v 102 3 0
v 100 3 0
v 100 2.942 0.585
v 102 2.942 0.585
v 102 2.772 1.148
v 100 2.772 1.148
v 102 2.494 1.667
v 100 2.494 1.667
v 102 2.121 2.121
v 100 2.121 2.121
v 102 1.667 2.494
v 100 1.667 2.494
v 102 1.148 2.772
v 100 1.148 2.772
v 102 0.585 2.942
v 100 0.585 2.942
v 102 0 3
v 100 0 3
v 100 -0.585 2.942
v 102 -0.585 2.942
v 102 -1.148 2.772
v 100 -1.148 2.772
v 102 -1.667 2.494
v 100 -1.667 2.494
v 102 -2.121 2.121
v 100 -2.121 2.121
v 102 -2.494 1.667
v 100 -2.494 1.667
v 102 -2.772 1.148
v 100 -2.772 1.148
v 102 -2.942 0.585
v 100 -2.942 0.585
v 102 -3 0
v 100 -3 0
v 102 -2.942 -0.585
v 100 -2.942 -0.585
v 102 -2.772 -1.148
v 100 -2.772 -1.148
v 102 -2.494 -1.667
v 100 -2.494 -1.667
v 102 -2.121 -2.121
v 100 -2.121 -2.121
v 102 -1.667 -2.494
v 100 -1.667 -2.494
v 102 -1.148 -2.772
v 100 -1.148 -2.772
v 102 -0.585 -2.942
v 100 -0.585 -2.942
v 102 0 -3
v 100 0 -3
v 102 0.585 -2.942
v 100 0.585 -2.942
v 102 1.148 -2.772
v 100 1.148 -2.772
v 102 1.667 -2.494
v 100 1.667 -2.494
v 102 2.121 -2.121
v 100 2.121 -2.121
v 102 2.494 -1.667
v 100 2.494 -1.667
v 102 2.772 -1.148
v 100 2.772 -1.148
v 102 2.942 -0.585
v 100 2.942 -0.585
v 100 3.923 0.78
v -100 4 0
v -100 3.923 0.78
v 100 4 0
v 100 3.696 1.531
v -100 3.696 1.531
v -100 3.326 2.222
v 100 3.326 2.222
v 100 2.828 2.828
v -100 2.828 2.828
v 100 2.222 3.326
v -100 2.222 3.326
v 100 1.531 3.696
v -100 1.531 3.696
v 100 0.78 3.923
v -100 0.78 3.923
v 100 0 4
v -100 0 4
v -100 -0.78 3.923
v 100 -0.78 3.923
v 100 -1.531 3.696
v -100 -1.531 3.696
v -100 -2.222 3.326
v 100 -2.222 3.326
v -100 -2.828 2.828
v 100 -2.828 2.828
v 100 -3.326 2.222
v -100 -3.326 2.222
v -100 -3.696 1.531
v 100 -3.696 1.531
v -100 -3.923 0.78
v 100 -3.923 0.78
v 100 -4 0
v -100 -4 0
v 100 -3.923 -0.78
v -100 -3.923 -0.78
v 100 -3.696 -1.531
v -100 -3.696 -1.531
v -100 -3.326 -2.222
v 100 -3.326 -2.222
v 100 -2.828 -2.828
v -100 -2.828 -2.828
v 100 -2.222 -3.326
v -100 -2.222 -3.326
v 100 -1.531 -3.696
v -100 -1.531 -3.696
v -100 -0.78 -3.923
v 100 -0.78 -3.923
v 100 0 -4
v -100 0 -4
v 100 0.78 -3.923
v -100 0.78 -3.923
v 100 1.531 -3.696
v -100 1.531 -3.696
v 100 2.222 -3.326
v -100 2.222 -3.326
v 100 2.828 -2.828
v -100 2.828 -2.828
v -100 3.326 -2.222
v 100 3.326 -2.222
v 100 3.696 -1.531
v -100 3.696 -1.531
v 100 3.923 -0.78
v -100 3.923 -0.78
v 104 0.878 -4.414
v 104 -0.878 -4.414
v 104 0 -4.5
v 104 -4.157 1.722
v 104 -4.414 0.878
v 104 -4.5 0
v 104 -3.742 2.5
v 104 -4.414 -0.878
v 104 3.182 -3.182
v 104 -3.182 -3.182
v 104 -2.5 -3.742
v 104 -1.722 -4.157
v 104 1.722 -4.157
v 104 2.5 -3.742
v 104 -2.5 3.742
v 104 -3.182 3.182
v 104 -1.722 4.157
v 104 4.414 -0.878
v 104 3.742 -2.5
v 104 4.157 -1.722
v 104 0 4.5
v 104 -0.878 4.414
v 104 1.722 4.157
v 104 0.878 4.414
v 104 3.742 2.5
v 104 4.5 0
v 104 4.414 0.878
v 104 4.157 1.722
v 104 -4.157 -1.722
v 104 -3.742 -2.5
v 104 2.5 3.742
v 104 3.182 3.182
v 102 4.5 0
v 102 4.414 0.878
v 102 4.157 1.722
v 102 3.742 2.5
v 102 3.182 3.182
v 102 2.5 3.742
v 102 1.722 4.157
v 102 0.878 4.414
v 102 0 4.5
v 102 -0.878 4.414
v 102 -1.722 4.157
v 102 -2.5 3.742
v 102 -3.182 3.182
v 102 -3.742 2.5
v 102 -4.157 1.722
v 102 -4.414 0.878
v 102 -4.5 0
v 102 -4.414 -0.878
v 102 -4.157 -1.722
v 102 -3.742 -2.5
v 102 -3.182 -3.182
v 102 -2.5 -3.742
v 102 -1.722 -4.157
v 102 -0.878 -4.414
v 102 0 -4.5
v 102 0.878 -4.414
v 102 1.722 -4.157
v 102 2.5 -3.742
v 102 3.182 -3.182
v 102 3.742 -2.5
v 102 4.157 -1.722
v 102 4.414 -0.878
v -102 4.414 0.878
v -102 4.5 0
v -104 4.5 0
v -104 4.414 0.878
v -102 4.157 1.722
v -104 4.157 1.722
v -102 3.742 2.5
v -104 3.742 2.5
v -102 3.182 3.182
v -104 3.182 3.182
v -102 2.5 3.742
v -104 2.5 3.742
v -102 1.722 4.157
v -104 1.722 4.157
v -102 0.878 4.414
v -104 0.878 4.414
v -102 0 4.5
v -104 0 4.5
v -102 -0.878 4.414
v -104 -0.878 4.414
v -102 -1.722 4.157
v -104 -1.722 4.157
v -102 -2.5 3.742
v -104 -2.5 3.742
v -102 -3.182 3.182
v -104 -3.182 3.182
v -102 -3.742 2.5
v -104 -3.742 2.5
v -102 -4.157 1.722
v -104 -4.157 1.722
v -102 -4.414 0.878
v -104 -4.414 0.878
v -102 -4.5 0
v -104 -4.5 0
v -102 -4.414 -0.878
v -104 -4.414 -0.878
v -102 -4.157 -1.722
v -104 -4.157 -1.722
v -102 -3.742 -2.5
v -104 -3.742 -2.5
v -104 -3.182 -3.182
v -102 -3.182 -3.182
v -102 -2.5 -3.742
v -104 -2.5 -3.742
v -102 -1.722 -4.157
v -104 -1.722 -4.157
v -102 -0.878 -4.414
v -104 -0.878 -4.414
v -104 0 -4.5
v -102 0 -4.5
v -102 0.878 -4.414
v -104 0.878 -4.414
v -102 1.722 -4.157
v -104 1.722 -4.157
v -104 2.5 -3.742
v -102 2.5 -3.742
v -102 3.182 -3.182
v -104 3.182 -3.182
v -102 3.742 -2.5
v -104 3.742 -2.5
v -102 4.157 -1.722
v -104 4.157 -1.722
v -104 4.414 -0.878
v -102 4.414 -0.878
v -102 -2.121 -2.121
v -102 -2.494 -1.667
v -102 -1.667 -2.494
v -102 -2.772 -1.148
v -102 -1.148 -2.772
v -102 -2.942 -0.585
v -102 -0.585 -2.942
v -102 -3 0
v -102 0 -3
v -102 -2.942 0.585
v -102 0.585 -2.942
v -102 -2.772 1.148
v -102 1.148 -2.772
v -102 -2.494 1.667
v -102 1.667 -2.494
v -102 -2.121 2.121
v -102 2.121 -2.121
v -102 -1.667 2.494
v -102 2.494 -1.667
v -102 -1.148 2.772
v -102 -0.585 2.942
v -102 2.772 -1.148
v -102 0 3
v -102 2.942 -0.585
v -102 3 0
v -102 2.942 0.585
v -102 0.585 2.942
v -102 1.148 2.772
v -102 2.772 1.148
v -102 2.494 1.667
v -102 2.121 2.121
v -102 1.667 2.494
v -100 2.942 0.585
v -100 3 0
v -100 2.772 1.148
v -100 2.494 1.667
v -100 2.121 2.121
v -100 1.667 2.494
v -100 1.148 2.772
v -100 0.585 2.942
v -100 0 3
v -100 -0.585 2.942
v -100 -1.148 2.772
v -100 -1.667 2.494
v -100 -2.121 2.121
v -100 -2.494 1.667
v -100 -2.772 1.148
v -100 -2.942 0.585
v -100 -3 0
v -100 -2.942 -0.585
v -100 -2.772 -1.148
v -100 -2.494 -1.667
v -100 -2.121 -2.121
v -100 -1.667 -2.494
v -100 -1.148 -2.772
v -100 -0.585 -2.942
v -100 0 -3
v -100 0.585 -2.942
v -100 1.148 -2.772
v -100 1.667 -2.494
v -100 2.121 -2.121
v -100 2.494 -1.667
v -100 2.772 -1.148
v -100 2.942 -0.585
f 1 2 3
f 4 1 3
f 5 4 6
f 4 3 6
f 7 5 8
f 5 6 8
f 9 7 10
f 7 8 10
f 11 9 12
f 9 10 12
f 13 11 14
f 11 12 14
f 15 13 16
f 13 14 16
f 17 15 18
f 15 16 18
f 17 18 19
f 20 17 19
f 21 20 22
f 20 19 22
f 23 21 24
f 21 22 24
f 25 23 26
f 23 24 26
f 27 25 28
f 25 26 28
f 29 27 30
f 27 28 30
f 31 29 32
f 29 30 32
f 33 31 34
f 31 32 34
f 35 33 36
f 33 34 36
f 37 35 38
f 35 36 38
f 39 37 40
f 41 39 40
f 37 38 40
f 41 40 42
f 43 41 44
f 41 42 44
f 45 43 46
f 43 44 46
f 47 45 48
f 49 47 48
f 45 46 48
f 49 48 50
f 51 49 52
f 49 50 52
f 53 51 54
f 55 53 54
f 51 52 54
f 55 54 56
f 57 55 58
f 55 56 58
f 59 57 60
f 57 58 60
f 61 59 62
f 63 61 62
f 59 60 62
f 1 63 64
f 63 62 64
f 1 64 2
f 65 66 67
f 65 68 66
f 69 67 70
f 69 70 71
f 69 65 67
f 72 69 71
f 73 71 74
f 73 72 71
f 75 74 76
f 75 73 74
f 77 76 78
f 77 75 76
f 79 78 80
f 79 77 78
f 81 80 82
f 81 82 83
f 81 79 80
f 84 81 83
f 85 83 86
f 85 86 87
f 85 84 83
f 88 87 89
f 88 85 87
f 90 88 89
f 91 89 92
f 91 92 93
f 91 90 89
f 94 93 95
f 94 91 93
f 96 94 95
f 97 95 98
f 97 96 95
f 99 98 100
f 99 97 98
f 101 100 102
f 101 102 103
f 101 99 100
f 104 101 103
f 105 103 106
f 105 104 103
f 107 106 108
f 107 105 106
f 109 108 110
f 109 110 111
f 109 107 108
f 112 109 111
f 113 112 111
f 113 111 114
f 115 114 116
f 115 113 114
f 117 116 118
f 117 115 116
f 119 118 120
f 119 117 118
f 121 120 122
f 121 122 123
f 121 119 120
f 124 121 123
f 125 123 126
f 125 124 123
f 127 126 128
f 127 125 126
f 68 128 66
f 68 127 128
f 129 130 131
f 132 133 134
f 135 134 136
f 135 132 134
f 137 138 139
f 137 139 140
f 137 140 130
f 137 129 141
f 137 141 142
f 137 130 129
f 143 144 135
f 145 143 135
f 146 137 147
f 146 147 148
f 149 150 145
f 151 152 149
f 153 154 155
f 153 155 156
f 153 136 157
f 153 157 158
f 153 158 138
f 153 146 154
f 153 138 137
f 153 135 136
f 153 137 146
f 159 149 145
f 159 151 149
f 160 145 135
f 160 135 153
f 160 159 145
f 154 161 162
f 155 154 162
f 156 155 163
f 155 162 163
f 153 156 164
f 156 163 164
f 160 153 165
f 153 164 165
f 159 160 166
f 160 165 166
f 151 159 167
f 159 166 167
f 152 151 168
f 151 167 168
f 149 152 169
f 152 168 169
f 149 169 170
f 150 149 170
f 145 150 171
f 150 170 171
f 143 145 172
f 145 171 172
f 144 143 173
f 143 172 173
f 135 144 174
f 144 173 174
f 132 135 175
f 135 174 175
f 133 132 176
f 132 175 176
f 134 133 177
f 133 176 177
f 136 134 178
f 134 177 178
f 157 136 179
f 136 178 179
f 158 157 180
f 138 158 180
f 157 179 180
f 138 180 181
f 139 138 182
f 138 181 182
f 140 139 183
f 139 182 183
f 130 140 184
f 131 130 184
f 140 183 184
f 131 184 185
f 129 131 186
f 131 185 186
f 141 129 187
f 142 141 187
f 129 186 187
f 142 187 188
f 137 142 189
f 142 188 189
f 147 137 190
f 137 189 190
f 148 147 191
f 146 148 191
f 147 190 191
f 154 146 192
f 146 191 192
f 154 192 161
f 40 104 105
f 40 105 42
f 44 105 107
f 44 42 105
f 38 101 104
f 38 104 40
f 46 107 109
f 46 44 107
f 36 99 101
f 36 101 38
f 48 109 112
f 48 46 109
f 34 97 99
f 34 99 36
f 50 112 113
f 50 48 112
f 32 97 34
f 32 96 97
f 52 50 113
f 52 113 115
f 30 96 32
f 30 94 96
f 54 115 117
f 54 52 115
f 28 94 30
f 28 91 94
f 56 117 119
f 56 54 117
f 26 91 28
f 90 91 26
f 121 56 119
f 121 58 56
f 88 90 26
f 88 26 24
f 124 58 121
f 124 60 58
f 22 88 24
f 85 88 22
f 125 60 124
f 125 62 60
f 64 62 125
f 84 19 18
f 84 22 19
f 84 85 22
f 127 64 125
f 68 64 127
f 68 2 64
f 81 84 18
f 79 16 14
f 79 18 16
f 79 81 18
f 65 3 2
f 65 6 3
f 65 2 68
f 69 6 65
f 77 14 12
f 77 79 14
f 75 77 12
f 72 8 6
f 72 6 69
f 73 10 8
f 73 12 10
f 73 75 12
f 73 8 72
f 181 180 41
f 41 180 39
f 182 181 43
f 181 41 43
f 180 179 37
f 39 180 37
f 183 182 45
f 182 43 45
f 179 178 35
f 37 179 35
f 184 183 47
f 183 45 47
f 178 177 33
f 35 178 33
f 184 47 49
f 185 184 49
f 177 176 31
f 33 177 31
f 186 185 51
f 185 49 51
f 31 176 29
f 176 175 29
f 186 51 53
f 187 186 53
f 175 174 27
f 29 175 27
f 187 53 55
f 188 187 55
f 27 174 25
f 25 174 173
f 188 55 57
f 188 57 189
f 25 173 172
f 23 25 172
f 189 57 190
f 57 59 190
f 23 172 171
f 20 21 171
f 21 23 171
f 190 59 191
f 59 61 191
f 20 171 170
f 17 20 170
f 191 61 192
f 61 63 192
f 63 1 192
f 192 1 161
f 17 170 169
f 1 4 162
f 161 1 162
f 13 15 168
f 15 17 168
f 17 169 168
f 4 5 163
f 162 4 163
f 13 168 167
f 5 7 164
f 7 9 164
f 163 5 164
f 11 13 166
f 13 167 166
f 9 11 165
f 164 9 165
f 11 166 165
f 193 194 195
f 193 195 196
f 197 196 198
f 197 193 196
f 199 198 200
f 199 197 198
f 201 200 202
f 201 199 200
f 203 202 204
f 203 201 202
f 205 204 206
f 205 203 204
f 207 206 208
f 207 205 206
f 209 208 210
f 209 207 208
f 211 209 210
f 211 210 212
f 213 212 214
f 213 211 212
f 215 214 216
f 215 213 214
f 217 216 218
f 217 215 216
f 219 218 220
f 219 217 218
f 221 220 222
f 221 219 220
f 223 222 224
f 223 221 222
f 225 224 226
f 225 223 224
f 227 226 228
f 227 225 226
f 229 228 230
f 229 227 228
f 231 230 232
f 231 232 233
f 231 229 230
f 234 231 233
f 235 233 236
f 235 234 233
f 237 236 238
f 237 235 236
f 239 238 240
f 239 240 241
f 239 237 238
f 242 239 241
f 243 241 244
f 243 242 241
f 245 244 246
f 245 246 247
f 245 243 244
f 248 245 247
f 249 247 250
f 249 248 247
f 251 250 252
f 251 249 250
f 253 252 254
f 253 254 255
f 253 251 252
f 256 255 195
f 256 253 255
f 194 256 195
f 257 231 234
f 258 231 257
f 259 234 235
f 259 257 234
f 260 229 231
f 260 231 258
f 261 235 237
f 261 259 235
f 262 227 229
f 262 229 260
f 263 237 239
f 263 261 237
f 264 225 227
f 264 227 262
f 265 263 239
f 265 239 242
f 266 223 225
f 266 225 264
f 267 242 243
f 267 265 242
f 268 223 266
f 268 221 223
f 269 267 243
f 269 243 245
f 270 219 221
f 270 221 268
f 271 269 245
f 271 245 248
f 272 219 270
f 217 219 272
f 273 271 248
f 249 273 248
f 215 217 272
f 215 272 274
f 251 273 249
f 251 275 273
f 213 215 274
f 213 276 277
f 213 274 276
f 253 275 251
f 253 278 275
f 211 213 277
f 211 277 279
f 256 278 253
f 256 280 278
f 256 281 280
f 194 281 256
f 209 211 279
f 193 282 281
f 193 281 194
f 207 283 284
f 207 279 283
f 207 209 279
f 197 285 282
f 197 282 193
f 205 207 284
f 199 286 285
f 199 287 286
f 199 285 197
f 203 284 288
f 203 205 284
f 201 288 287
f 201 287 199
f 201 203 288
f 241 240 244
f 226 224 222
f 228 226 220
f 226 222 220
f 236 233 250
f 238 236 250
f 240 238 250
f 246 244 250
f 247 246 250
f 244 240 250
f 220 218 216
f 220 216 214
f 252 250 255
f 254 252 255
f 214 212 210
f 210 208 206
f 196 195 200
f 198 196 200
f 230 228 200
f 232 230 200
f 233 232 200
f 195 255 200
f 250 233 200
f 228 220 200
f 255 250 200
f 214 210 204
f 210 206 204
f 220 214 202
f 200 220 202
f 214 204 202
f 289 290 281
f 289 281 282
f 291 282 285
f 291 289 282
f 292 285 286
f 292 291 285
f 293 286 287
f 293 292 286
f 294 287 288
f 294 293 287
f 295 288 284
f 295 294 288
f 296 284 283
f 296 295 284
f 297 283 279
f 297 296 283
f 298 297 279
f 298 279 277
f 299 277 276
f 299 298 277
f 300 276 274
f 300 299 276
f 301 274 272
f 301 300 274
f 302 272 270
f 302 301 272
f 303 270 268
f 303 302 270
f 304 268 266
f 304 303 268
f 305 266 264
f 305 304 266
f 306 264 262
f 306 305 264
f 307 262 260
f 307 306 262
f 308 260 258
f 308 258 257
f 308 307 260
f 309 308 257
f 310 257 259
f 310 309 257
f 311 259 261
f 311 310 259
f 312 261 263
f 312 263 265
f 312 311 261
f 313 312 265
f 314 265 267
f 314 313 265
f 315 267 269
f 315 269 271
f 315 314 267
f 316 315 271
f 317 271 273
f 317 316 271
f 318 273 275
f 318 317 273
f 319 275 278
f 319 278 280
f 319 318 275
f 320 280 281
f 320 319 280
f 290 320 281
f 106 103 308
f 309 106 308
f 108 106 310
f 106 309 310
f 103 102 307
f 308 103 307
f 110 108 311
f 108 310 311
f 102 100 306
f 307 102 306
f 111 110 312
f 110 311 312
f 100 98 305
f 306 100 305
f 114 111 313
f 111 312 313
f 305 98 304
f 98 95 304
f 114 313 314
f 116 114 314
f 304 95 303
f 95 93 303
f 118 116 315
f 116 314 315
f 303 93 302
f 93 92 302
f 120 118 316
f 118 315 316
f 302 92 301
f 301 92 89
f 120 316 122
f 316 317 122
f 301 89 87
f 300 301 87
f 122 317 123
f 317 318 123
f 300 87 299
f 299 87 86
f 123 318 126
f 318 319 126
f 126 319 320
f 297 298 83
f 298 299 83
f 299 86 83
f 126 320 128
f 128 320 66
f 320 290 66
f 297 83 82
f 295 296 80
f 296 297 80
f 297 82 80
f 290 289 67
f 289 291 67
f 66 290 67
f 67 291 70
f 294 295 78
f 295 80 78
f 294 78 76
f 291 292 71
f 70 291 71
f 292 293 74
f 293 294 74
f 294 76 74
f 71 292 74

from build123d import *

# Parameters (mm, degrees)
F0_R     = 4
F1_DEPTH = 100
F2_R     = 3
F3_DEPTH = 2
F4_R     = 4.5
F4_R_2   = 3
F5_DEPTH = 2


with BuildPart() as f1:
    # F0 (on Right) → F1 (new body)
    with BuildSketch(Plane.YZ):
        Circle(F0_R)
    extrude(amount=F1_DEPTH)

    # F2 (on face) → F3 (join)
    with BuildSketch(Plane.YZ.offset(100)):
        Circle(F2_R)
    extrude(amount=F3_DEPTH)

    # F4 (on face) → F5 (join)
    with BuildSketch(Plane.YZ.offset(102)):
        Circle(F4_R)
        Circle(F4_R_2, mode=Mode.SUBTRACT)
        Circle(F4_R_2)
    extrude(amount=F5_DEPTH)

    # F6: F1 across plane


with BuildPart() as f1_1:
    add(f1.part)
    add(f1.part.mirror(Plane.YZ))


solid = f1_1.part
